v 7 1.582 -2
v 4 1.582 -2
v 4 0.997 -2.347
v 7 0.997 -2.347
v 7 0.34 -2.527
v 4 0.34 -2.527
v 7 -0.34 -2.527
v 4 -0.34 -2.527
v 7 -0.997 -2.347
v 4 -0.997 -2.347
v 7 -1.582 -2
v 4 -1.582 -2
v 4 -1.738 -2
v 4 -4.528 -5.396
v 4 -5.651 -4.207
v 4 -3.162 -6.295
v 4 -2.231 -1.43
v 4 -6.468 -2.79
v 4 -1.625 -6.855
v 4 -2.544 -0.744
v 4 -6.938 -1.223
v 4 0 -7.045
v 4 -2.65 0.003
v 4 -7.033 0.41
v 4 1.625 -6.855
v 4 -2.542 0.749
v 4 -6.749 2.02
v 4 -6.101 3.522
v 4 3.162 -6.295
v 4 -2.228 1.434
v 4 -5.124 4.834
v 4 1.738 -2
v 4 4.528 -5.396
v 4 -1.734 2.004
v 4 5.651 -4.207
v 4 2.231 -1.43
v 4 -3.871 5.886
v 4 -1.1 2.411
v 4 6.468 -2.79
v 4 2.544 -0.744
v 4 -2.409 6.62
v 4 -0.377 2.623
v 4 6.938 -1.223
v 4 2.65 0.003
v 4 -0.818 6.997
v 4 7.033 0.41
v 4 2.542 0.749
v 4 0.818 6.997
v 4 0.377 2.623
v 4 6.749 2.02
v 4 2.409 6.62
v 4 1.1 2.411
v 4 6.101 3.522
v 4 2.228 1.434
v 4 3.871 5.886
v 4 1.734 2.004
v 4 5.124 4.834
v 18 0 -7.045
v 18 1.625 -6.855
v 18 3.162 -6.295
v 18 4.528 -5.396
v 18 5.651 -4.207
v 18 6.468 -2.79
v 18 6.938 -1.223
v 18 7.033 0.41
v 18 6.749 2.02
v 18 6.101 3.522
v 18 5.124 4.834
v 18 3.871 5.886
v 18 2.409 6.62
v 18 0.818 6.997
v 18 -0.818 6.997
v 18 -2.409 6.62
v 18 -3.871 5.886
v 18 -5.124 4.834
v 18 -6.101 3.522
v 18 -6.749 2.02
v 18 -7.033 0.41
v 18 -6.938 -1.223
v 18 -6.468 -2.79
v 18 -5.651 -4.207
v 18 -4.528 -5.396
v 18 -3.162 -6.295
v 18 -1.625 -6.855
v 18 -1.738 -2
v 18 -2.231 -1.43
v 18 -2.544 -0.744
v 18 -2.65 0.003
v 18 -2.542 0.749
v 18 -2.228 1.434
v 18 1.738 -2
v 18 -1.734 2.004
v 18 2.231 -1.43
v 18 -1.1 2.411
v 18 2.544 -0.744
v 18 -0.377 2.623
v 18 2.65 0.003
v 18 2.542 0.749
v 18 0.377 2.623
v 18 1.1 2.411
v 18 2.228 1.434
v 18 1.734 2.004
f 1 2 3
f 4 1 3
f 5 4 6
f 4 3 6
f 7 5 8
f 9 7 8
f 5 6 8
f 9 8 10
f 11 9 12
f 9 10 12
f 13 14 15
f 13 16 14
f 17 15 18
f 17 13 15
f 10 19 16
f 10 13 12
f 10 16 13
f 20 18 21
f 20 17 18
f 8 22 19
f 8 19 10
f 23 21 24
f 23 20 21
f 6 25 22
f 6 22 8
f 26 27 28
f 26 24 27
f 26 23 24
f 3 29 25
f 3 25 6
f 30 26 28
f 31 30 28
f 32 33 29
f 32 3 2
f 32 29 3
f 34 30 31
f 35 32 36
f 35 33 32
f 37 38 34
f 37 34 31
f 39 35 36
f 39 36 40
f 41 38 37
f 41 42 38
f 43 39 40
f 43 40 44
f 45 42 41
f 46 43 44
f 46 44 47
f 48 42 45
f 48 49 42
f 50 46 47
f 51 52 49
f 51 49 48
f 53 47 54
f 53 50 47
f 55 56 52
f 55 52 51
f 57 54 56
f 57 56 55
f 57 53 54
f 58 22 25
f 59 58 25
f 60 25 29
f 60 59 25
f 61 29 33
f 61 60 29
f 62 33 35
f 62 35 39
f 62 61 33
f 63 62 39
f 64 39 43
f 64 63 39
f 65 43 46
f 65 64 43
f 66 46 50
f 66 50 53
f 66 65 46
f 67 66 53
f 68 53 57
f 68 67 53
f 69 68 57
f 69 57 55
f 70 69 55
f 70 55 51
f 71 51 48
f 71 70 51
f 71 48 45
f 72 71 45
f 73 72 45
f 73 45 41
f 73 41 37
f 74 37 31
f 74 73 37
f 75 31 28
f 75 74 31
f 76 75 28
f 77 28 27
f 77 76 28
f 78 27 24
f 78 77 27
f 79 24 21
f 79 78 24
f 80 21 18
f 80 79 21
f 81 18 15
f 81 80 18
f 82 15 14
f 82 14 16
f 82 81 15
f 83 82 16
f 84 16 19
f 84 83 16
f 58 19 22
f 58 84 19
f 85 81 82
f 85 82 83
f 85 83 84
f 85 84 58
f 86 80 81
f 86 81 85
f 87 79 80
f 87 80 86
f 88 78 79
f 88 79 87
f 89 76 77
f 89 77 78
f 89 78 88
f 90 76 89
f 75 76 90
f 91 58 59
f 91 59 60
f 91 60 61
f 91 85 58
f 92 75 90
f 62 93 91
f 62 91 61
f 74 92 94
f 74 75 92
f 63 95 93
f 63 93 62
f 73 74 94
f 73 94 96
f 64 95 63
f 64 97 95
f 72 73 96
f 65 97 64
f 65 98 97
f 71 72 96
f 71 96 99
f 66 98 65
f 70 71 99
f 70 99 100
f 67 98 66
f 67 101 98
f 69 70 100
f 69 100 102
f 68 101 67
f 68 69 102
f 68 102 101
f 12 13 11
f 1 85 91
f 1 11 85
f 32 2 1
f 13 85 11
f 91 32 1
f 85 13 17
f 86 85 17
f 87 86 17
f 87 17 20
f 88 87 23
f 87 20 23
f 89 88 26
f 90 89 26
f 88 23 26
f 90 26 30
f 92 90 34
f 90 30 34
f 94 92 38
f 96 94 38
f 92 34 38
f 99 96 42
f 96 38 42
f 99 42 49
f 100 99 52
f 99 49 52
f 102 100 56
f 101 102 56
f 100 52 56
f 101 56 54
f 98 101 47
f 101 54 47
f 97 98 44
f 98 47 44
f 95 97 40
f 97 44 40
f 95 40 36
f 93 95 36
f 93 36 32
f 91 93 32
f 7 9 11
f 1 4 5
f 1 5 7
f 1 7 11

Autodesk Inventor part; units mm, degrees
ref_plane "YZ Plane" through (0, 0, 0) normal (1, 0, 0) x (0, 1, 0)
ref_plane "XY Plane" through (0, 0, 0) normal (0, 0, 1) x (1, 0, 0)
sketch "Esquisse1" plane through (0, 0, 0) normal (0, 0, 1) x (1, 0, 0)
  line L0 (0, 0) -> (0, 38)
  line L1 (0, 38) -> (30, 38)
  line L2 (30, 38) -> (30, 35.5)
  line L3 (30, 35.5) -> (0, 35.5)
  line L4 (0, 0) -> (0, 10)
  line L5 (0, 10) -> (18, 10)
  line L6 (18, 10) -> (18, 0)
  line L7 (18, 0) -> (0, 0)
  line L8 (-6, 0) -> (36, 0) projected
  dimension "d0" = 38
  dimension "d1" = 30
  dimension "d2" = 2.5
  dimension "d3" = 10
  dimension "d4" = 18
revolve "Révolution1" add sketch "Esquisse1" angle 360 about axis through (-10, 0, 0) along (1, 0, 0)
ref_plane "Plan de construction1" through (0, 10, 0) normal (0, 1, 0) x (-1, 0, 0)
sketch "Esquisse2" plane through (0, 10, 0) normal (0, 1, 0) x (-1, 0, 0)
  line L0 (0, 0) -> (0, 1)
  line L1 (0, 38) -> (0, -38) projected
  line L2 (0, 1) -> (-18, 1)
  line L3 (-18, 1) -> (-18, -1)
  line L4 (-18, -1) -> (0, -1)
  line L5 (0, 0) -> (0, -1)
  dimension "d7" = 1
  dimension "d8" = 18
  dimension "d9" = 2
  dimension "d10" = 90
extrude "Extrusion1" add sketch "Esquisse2" along normal up to surface
sketch "Esquisse3" plane through (30, 0, 0) normal (1, 0, 0) x (0, 0, -1)
  circle A0 centre (0, 0) radius 38 projected
  circle A1 centre (0, 0) radius 38 projected
  line L0 (0, 38) -> (0, 40)
  line L1 (0, 40) -> (0.5, 40)
  line L2 (0.5, 40) -> (0.5, 37.9967)
  line L3 (0, 40) -> (-0.5, 40)
  line L4 (-0.5, 40) -> (-0.5, 37.9967)
  dimension "d13" = 2
  dimension "d14" = 0.5
  dimension "d15" = 0.5
extrude "Extrusion2" add sketch "Esquisse3" against normal blind 30 contours A0 L0 L1 L2 | L4 L3 L0 A0
pattern_circular "Réseau circulaire1" count 10 over 360 about axis through (9, 0, 0) along (1, 0, 0) of "Extrusion1"
pattern_circular "Réseau circulaire2" count 40 over 360 about axis through (9, 0, 0) along (1, 0, 0) of "Extrusion2"
sketch "Esquisse4" plane through (0, 0, 0) normal (-1, 0, 0) x (0, 0, 1)
  circle A0 centre (0, 0) radius 2.85
  circle A1 centre (0, 0) radius 2.65
  line L0 (2.65, 0) -> (-2, 0)
  line L1 (-2, 0) -> (-2, 1.7385)
  line L2 (-2, 0) -> (-2, -1.7385)
  point P0 (-1.816, -1.3284)
  point P1 (-1.816, 1.3284)
  dimension "d24" = 5.7
  dimension "d25" = 5.3
  dimension "d26" = 4.65
extrude "Extrusion3" cut sketch "Esquisse4" against normal blind 25 contours L0 L1 A1 | A1 L2 L0
sketch "Esquisse7" plane through (0, 0, 0) normal (-1, 0, 0) x (0, 0, 1)
  circle A0 centre (0, 0) radius 2.55
  dimension "d30" = 5.1
extrude "Extrusion4" cut sketch "Esquisse7" against normal blind 7
sketch "Esquisse8" plane through (0, 0, 0) normal (-1, 0, 0) x (0, 0, 1)
  arc A0 (-2, 1.5819) -> (-2, -1.5819) centre (0, 0) ccw projected
  circle A1 centre (0, 0) radius 35.5
  line L0 (-2, 1.5819) -> (-2, -1.5819) projected
  arc A2 (-2, 1.5819) -> (-2, -1.5819) centre (0, 0) ccw projected
extrude "Extrusion5" cut sketch "Esquisse8" against normal blind 4 contours L0 A0 | A1
sketch "Esquisse9" plane through (18, 0, 0) normal (1, 0, 0) x (0, 0, -1)
  arc A0 (2, -1.5819) -> (2, 1.5819) centre (0, 0) ccw projected
  circle A1 centre (0, 0) radius 7.0446
  circle A2 centre (0, 0) radius 44.6529
extrude "Extrusion6" cut sketch "Esquisse9" along normal through all both and the other way through all
properties part number "Roue test"
